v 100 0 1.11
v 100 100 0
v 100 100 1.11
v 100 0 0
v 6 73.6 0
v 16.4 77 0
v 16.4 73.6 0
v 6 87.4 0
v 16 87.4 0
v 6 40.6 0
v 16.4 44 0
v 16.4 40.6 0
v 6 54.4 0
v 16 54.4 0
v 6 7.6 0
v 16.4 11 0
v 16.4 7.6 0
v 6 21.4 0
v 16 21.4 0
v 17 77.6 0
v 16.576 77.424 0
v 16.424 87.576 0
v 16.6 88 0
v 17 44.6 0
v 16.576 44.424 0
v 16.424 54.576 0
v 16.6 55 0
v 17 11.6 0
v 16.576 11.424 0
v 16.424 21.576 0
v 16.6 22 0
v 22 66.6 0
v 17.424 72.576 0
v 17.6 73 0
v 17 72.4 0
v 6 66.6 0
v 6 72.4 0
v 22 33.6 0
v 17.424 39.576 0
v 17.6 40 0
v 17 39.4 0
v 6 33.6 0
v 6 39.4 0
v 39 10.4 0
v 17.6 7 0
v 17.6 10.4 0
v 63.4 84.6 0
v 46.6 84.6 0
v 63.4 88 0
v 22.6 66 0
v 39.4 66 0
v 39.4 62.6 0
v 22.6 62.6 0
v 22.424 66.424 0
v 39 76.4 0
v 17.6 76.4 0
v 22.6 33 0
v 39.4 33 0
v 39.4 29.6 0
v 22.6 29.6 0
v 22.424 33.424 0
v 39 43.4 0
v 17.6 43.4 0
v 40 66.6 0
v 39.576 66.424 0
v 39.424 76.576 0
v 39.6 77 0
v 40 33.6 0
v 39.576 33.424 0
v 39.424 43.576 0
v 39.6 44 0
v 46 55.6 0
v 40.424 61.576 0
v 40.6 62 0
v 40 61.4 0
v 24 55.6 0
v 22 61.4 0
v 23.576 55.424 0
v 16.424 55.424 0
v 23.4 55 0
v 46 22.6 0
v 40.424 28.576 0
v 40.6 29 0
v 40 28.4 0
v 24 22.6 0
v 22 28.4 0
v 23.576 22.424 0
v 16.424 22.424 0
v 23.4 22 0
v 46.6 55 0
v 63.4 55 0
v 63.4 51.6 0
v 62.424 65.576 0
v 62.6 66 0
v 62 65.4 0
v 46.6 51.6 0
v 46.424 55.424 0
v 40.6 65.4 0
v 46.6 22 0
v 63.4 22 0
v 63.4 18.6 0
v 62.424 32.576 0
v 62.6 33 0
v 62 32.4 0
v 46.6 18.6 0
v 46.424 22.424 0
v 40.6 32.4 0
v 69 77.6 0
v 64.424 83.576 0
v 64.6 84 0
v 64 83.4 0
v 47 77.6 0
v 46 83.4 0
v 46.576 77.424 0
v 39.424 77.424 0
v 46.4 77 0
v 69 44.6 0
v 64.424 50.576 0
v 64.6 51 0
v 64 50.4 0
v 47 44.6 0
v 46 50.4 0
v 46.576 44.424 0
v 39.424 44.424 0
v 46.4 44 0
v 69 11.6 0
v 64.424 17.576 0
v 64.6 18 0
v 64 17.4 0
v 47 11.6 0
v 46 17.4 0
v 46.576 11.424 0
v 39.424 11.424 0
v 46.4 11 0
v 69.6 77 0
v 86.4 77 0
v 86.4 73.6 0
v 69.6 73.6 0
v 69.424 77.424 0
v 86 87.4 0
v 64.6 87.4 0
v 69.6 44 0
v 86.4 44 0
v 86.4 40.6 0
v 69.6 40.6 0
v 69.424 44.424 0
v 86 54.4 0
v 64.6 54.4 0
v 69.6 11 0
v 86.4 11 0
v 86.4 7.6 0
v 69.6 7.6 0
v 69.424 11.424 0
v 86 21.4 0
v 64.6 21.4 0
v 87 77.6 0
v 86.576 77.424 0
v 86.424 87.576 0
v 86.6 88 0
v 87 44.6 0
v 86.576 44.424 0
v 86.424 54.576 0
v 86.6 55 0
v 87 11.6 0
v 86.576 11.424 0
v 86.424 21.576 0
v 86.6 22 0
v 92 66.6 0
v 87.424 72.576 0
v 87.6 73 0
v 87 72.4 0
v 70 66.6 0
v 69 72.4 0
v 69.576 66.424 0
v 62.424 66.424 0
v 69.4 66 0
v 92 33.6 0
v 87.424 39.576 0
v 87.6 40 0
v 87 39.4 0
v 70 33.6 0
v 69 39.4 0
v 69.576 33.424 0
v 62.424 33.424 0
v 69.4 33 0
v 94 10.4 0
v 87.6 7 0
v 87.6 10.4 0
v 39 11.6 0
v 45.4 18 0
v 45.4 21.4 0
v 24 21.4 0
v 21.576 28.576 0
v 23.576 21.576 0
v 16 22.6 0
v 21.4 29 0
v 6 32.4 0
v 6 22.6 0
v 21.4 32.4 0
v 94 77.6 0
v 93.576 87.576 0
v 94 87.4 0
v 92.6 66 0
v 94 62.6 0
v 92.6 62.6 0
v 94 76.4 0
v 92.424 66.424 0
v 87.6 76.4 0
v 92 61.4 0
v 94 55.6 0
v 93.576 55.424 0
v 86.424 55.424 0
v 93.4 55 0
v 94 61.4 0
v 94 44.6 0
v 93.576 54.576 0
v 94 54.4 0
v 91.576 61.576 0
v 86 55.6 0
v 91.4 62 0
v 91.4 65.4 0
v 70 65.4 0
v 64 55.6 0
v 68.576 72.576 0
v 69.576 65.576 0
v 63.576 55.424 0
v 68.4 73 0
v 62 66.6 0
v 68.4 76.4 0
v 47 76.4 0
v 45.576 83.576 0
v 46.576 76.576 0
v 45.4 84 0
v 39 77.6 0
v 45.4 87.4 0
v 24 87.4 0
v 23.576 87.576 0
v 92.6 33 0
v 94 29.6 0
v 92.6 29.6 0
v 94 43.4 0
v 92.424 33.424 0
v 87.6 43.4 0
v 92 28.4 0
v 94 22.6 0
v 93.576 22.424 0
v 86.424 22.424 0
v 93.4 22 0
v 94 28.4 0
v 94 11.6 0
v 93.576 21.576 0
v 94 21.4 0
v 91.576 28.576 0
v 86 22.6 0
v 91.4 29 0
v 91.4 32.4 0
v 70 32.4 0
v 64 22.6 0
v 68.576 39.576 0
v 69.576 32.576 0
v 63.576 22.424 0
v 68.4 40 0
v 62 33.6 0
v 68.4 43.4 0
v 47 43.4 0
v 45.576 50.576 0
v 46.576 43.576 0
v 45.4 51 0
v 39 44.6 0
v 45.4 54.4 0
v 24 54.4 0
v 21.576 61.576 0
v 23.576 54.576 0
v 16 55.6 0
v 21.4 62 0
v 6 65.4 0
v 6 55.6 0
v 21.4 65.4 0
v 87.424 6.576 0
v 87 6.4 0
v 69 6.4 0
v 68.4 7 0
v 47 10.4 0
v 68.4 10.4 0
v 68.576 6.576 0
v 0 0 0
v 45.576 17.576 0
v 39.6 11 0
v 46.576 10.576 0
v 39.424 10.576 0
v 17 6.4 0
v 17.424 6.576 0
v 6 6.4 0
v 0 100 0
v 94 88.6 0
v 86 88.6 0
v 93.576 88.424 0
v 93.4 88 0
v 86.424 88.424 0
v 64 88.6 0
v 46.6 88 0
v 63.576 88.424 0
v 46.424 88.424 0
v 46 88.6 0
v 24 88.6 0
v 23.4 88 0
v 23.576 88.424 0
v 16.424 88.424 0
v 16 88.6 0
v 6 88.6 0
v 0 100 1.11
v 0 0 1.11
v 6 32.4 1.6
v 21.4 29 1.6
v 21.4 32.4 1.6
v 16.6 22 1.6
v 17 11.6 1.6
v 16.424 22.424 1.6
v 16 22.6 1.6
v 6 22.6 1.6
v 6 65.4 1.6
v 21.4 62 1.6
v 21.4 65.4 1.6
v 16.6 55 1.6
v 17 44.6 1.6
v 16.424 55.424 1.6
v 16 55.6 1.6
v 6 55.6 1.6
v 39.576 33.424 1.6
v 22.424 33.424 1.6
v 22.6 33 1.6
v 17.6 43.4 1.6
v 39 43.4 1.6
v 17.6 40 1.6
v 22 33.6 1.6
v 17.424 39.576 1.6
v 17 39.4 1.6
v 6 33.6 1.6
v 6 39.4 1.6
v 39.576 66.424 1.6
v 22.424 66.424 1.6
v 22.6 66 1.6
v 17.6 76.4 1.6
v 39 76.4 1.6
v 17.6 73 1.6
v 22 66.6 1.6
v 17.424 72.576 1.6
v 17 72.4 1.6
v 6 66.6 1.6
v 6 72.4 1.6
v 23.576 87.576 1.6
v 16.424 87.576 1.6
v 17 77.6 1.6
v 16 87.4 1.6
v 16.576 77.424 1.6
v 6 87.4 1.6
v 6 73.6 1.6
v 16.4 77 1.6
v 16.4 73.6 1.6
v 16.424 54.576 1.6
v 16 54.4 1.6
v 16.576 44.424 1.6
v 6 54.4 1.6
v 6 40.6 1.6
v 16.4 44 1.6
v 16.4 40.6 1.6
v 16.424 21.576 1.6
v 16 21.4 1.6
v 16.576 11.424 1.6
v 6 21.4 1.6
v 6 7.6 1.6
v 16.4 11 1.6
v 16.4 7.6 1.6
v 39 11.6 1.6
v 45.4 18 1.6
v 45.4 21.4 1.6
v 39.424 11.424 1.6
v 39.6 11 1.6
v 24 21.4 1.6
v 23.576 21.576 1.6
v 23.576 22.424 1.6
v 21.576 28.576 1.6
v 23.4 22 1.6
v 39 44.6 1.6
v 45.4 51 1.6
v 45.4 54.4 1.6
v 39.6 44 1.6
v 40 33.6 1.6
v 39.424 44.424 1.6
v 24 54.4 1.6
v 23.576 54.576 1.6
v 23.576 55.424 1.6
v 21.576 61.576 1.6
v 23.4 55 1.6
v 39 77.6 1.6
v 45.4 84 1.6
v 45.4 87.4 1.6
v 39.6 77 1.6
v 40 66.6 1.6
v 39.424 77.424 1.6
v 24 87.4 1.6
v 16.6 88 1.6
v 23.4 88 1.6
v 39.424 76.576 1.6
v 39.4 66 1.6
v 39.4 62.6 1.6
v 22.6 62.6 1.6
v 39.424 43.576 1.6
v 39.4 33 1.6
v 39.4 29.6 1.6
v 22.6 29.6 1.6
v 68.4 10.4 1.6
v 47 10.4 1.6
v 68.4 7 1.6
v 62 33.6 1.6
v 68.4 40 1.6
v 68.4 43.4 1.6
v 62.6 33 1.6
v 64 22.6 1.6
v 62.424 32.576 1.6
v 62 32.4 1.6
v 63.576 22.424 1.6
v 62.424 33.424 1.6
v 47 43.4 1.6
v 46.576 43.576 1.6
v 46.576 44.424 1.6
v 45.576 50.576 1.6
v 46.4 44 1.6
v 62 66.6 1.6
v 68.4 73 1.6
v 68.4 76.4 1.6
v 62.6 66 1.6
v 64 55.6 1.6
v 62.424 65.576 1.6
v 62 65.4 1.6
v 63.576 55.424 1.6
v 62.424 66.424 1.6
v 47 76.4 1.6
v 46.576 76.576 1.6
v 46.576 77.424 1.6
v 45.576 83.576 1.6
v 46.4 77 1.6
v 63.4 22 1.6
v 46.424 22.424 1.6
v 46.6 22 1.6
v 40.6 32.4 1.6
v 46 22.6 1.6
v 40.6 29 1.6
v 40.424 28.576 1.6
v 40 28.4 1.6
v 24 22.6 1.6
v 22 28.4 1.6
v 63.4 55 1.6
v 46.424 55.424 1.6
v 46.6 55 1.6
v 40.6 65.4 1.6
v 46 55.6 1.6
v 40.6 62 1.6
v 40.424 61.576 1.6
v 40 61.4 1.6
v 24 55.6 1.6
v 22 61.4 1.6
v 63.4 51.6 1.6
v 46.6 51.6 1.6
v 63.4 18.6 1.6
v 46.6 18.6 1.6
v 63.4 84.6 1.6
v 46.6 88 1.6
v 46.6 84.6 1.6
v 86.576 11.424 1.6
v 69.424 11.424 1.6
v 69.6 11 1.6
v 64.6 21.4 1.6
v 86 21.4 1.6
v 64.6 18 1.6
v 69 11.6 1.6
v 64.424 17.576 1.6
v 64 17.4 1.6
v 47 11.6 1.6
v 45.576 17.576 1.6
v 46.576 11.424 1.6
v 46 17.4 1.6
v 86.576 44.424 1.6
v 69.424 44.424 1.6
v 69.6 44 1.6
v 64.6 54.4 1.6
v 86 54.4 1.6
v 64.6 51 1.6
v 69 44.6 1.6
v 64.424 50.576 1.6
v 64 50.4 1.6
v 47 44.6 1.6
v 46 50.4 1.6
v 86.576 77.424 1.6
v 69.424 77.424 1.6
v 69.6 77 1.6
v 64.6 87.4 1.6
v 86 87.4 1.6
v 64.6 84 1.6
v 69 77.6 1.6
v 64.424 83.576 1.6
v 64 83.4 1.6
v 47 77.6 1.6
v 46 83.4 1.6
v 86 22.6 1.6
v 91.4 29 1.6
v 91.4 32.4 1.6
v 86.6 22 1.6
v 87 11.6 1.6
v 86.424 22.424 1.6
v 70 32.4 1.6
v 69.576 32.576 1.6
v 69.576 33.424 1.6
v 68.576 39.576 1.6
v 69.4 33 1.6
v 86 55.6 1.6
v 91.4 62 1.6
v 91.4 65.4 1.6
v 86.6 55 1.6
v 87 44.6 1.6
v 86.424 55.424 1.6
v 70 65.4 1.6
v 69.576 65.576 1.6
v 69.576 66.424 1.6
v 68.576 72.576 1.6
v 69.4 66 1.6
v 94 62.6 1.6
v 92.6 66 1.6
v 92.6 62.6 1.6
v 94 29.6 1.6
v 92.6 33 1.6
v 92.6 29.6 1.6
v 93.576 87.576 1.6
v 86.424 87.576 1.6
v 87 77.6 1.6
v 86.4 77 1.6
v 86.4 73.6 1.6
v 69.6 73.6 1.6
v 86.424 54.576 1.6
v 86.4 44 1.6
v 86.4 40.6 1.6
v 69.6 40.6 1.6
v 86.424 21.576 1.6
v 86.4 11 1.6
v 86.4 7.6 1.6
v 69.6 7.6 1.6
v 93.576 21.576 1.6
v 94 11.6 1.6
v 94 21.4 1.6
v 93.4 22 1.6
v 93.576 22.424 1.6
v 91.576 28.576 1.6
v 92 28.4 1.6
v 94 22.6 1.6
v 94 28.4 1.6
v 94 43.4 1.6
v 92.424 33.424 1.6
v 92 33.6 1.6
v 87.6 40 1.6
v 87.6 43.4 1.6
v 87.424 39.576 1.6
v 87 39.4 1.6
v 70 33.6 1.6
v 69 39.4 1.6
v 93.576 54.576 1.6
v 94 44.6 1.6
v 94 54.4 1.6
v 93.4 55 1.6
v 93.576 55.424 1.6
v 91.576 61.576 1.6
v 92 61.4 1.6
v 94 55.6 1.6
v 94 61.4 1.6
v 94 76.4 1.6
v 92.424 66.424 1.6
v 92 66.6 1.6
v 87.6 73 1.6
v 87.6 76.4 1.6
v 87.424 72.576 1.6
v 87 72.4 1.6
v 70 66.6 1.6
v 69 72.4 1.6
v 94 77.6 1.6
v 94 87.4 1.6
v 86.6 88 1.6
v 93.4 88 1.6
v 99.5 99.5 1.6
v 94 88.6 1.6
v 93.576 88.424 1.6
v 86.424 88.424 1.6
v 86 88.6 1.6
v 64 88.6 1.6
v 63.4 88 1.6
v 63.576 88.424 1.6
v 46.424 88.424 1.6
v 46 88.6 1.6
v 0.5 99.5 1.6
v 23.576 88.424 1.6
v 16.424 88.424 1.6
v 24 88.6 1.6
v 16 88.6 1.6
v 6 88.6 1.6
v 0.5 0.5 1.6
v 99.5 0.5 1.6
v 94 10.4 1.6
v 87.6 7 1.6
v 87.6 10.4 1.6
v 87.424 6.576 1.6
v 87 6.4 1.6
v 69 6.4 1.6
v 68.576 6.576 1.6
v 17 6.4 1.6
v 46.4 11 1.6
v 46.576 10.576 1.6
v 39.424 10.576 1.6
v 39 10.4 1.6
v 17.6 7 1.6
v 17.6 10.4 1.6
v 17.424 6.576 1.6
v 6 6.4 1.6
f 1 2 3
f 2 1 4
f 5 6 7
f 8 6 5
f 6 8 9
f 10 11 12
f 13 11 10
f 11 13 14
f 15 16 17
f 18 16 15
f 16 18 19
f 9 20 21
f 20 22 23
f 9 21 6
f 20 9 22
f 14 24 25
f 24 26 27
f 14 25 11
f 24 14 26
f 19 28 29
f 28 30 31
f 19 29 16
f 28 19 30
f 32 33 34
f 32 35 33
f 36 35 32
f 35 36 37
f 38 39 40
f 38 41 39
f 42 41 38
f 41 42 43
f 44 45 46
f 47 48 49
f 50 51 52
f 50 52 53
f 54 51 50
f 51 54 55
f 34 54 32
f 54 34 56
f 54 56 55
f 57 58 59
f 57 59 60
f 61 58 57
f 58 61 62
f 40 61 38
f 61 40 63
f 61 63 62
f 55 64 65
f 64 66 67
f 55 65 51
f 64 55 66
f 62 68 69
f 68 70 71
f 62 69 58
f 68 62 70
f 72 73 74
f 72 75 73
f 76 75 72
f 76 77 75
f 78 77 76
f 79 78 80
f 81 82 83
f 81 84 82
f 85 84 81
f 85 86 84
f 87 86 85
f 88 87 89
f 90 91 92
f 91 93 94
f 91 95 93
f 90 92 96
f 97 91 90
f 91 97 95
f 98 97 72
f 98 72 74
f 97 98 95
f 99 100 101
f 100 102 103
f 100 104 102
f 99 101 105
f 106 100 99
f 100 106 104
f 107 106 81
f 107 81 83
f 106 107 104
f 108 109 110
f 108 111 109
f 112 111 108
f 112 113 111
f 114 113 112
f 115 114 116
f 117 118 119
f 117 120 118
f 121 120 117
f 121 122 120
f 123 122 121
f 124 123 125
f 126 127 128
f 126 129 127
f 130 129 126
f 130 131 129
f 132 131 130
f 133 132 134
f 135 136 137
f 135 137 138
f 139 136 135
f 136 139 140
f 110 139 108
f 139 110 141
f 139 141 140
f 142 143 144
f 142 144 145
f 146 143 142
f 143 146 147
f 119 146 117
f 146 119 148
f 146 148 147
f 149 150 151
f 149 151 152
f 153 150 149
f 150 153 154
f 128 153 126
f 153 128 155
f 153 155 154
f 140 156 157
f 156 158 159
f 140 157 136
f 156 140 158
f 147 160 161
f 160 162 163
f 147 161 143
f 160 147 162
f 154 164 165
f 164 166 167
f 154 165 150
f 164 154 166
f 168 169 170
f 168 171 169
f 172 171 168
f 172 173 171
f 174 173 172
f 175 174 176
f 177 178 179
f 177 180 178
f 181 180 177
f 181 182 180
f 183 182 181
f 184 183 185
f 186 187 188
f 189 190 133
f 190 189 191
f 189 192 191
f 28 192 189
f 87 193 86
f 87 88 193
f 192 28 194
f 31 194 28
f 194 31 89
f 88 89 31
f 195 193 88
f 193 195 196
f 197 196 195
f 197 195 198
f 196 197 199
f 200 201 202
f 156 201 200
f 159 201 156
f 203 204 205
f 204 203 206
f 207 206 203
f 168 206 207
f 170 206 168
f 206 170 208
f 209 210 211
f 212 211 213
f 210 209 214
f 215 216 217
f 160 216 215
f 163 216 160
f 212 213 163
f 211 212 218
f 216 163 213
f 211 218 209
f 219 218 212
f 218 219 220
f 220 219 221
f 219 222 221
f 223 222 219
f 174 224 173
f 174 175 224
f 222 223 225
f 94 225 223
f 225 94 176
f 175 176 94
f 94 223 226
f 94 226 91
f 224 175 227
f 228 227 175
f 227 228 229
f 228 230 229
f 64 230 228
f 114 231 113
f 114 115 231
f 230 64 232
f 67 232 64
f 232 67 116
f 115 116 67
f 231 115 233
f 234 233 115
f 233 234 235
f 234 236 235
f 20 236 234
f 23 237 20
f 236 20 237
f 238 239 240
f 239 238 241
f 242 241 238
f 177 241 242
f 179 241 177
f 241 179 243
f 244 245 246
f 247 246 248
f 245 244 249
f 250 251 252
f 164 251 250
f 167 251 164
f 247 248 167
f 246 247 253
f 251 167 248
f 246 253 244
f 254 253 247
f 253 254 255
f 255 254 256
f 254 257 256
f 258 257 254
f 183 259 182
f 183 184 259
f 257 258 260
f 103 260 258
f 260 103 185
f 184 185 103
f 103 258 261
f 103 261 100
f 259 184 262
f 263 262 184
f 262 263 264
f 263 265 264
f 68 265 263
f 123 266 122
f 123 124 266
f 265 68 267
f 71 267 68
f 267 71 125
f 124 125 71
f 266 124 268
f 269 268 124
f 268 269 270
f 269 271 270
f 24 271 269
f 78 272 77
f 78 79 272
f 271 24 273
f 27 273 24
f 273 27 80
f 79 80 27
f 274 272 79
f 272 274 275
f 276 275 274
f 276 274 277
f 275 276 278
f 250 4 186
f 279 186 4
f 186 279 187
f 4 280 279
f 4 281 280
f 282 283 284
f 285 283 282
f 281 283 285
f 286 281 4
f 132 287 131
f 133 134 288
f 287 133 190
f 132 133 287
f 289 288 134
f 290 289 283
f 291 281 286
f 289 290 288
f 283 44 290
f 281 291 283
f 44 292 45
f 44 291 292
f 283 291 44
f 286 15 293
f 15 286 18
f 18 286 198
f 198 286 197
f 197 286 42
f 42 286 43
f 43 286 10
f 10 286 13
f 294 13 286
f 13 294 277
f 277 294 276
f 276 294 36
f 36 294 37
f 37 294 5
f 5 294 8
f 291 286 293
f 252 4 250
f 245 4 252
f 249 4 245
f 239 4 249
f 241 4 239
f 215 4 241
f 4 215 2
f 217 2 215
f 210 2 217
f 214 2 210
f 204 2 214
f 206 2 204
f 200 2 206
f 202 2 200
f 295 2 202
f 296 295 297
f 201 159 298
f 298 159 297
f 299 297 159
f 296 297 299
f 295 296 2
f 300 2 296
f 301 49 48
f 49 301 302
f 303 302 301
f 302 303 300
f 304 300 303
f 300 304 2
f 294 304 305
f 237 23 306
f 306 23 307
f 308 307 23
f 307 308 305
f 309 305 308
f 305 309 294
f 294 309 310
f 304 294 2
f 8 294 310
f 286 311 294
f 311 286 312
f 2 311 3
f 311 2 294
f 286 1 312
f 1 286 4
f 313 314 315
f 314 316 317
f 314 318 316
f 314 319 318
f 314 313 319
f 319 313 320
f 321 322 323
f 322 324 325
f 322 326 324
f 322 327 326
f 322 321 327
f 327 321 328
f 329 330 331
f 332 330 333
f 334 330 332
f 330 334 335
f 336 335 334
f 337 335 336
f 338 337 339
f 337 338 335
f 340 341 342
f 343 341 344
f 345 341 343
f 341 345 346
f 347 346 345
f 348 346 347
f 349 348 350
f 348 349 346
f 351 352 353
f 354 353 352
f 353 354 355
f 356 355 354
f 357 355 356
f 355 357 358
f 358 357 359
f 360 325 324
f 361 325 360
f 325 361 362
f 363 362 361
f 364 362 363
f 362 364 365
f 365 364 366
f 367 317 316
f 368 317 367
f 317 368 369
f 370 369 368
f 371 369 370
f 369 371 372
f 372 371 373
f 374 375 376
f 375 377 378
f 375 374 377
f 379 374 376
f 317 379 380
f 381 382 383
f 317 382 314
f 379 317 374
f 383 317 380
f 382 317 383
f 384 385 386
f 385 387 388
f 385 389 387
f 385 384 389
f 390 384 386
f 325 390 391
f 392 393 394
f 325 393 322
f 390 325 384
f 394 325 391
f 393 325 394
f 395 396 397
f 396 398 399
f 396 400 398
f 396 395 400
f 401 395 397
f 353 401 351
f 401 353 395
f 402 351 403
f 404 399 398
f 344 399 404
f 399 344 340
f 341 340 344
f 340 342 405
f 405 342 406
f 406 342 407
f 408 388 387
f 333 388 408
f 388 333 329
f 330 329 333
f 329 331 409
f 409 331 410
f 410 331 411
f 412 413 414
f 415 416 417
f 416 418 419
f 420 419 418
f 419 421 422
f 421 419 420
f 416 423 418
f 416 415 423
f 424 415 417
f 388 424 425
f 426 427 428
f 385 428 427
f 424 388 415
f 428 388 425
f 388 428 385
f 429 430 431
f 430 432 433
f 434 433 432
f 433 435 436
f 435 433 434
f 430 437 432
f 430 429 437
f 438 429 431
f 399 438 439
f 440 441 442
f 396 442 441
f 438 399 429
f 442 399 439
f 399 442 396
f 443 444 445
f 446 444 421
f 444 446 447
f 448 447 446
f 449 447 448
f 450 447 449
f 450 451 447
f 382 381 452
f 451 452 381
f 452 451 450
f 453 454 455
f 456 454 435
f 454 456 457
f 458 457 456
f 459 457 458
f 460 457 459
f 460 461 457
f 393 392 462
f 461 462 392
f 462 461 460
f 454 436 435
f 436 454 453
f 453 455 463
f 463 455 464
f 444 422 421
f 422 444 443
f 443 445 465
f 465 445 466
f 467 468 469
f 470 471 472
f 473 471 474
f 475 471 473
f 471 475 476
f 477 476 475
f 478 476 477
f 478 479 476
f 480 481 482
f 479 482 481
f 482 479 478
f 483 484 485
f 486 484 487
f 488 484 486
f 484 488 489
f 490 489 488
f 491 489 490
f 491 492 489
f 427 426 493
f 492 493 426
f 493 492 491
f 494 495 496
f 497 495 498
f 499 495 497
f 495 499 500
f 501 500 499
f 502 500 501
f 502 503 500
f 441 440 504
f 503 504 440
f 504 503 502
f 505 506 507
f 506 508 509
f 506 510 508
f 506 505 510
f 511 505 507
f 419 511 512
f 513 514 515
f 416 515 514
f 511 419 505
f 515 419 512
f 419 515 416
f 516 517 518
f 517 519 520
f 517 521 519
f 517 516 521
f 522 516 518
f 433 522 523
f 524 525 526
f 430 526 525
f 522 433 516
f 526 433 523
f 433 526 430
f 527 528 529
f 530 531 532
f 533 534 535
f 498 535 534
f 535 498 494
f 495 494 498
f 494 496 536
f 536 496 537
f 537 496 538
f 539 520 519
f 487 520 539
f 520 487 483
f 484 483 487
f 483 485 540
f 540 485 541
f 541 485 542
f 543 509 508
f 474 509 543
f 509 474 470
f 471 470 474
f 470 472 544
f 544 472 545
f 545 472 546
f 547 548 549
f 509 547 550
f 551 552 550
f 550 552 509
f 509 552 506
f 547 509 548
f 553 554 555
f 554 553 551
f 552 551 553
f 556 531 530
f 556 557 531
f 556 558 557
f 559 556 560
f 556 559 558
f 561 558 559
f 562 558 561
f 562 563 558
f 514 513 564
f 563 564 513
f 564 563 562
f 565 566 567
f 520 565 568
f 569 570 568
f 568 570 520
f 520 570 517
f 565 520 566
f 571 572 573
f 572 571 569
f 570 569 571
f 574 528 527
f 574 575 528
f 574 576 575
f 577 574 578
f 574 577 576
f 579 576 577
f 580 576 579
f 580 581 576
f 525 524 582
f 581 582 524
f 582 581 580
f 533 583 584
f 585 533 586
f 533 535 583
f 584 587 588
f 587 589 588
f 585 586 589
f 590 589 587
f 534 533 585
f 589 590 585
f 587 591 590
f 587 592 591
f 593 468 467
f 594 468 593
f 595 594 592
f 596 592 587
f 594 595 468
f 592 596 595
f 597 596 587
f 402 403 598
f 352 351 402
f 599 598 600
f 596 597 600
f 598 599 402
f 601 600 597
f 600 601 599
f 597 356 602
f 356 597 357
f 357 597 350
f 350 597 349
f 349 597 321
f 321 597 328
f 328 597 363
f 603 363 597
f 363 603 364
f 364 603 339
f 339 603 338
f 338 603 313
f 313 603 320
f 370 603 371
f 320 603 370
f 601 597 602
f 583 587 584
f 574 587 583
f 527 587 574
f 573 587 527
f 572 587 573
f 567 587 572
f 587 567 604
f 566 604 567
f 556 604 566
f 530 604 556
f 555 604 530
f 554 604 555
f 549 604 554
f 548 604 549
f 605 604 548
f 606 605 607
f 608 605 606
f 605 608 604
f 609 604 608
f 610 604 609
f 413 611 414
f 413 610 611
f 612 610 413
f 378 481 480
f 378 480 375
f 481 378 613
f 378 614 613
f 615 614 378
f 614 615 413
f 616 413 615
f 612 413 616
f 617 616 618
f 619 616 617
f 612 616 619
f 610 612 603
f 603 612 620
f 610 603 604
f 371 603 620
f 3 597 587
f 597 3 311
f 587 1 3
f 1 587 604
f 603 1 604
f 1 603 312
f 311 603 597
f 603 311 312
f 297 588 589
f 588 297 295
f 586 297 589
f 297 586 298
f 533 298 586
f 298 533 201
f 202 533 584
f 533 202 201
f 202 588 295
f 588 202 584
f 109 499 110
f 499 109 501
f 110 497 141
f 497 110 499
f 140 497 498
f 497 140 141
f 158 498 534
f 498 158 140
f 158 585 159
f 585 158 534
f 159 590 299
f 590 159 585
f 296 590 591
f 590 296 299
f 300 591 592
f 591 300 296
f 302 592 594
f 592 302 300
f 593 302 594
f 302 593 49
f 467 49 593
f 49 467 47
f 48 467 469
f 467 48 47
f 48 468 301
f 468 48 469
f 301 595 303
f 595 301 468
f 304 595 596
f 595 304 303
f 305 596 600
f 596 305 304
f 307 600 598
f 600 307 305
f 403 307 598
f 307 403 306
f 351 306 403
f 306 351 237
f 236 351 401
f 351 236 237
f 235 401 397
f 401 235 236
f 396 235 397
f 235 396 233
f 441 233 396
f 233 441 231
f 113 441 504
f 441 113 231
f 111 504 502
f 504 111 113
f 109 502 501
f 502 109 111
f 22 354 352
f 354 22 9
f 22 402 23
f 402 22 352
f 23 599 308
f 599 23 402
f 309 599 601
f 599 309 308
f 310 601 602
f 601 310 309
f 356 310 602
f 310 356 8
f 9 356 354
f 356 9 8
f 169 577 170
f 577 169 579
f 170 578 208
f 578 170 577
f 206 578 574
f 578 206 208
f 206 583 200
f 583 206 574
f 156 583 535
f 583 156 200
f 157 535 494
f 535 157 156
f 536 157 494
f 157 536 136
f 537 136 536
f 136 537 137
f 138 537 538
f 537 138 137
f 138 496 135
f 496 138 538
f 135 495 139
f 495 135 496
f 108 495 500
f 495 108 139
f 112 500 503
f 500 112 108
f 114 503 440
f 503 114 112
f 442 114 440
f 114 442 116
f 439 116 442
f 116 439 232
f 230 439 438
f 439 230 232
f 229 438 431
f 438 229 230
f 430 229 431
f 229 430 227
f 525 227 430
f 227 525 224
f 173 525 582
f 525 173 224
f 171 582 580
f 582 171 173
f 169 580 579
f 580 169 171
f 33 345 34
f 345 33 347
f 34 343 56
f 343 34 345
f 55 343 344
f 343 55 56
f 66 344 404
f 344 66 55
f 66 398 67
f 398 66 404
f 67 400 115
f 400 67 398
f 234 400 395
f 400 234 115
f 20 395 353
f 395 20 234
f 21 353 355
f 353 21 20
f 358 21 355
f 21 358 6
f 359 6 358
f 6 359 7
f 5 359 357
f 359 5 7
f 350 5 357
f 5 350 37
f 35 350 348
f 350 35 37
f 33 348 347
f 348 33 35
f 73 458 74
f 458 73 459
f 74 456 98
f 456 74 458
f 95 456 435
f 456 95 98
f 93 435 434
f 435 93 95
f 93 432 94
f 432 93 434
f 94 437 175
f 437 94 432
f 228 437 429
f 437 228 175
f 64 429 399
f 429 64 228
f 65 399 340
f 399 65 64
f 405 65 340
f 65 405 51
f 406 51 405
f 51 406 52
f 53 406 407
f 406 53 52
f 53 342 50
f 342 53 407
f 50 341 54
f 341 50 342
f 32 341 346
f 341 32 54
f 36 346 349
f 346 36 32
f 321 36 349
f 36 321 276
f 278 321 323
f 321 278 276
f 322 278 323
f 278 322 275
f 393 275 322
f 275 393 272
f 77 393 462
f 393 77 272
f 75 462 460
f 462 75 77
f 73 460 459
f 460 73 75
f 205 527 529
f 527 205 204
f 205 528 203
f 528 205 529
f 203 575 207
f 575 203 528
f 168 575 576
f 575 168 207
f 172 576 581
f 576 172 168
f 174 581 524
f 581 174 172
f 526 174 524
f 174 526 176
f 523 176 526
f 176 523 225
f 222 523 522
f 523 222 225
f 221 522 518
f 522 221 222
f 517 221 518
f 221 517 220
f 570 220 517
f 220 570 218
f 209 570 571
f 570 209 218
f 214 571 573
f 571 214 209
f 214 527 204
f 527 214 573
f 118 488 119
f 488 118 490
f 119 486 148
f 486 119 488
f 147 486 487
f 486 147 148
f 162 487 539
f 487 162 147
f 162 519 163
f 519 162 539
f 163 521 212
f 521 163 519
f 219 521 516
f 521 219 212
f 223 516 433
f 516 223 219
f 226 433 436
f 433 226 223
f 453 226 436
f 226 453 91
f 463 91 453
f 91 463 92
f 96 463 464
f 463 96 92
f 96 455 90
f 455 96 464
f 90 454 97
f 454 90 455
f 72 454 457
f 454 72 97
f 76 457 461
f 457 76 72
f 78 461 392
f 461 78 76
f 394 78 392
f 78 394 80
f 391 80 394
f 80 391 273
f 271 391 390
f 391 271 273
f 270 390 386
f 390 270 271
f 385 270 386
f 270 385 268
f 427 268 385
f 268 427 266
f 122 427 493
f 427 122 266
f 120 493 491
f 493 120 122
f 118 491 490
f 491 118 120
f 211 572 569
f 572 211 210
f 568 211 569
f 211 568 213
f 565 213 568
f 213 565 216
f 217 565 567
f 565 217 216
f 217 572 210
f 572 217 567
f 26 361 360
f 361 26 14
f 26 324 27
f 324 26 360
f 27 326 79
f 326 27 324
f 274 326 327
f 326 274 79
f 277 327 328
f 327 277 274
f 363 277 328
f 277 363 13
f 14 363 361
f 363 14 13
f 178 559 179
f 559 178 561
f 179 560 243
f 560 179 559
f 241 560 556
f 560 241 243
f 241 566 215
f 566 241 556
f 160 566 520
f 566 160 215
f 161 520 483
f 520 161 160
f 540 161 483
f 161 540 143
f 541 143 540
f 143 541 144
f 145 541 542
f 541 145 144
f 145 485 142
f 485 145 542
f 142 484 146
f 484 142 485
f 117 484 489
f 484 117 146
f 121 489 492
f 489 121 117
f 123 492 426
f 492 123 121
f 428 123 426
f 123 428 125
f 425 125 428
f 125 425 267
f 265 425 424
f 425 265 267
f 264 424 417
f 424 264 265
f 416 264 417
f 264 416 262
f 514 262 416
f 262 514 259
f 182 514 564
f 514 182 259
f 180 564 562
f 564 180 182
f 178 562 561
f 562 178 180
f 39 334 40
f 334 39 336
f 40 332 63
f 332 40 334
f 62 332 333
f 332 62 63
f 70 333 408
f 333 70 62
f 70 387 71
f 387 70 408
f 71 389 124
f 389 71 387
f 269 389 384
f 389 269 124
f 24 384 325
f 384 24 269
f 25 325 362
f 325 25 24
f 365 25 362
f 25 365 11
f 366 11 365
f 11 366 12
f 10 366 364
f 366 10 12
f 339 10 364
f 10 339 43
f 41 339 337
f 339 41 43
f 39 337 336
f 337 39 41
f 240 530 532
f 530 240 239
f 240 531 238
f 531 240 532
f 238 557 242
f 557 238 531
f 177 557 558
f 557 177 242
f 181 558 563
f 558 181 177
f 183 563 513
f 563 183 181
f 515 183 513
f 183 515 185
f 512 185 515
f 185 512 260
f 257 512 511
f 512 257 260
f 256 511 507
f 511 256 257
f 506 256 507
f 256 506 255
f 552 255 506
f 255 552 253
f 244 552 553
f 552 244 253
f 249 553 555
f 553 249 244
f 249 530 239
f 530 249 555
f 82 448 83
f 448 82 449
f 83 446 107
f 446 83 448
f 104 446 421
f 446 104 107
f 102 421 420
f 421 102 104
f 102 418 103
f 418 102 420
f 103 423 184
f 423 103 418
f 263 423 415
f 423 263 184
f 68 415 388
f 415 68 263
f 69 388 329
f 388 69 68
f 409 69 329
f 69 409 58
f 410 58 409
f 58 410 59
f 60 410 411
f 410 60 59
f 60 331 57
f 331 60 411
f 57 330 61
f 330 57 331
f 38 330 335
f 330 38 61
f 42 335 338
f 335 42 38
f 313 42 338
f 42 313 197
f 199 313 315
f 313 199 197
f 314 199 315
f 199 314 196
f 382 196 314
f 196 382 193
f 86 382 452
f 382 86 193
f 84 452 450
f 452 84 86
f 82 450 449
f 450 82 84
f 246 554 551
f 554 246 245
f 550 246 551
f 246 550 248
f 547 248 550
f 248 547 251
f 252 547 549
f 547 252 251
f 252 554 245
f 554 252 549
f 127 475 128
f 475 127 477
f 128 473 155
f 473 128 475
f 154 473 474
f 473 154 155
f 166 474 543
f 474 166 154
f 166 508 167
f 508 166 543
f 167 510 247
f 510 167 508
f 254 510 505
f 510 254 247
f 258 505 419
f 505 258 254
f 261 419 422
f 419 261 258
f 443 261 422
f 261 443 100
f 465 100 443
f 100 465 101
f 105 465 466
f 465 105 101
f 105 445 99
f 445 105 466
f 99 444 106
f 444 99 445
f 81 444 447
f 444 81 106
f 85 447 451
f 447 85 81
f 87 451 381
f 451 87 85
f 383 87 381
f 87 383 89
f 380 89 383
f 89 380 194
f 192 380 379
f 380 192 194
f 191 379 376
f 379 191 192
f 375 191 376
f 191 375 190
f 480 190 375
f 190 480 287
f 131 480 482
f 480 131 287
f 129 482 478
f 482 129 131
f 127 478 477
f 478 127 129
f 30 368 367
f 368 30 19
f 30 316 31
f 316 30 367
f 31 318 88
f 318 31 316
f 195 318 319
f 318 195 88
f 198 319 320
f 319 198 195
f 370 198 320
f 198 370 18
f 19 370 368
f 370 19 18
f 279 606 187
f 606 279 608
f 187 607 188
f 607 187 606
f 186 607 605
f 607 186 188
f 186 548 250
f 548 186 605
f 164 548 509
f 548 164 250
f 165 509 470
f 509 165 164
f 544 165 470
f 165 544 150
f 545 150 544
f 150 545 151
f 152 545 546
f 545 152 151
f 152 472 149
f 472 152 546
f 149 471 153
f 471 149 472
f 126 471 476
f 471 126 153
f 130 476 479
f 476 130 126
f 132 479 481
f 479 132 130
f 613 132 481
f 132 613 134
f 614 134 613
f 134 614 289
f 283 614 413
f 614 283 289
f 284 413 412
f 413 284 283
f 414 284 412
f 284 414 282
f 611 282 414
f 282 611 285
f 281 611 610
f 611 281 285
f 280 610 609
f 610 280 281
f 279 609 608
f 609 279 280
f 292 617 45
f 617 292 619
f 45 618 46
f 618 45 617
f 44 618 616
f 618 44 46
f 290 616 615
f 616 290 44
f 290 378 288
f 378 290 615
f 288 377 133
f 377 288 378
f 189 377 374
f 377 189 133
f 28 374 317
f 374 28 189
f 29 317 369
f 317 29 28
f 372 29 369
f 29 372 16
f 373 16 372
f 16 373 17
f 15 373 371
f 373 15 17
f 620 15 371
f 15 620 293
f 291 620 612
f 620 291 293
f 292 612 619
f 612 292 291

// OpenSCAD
// file: sashiko_config.scad
// sashiko_config.scad
// Shared plate configuration for every sashiko template. Change a value here and
// it applies to all templates at once. Each template `include`s this file — use
// `include`, NOT `use`, because `use` does not import top-level variables — and
// keeps only its own pattern-specific parameters (scale, corner_gap, bridge_sp …).

plate_w  = 100;   // plate width (mm)
plate_h  = 100;   // plate height (mm)
plate_t  = 1.6;   // plate thickness (mm) — slots are cut through all of it
groove_w = 1.2;   // slot width (mm)
border   = 6;     // solid border around plate edge (mm)
chamfer  = 0.5;   // 45° bevel on the four outer top edges (mm; 0 = off, keep <= t/2)
bridge_w = 1.4;   // solid tab left in each bridged slot (mm; ~1.2 min for strength)
reg      = false; // cut datum holes at the pattern-window corners for tiling (see README)
// file: sashiko_lib.scad
// sashiko_lib.scad
// Shared geometry helpers for sashiko stitch-guide templates.
//
// The slot pattern is built entirely in 2D and extruded ONCE at the end (see
// sashiko_plate). This is far faster than unioning thousands of 3D solids.
//
// Slots are cut FULL-THICKNESS so a marking pen/chalk reaches the fabric, and
// are interrupted by small solid "bridges" so the enclosed regions of a
// continuous-line pattern stay attached to the plate instead of dropping out.

// --- low level (2D) -------------------------------------------------------

// 2D rounded slot dash (a "stadium") between two points.
module slot_dash(p1, p2, r) {
    hull() {
        translate(p1) circle(r = r, $fn = 8);
        translate(p2) circle(r = r, $fn = 8);
    }
}

// Straight slot p1->p2 pulled in by `gap` at each end, leaving a solid corner
// where several meet (the corner-gap trick used by the polygon tilings — hishi,
// kikko, masu, …). Size gap to the SHARPEST angle θ between slots at the vertex:
// the solid neck between two caps is 2·gap·sin(θ/2) − 2r, so for a ~0.6 mm neck
// gap = 1.4 suits 90° corners and gap = 1.8 suits 60° corners.
module corner_seg(p1, p2, r, gap) {
    corner_seg2(p1, p2, r, gap, gap);
}

// corner_seg with a different gap at each end — for edges whose two vertices
// have different angles (size each gap to its own vertex; see itomaki,
// sorobandama).
module corner_seg2(p1, p2, r, g1, g2) {
    L = norm([p2[0]-p1[0], p2[1]-p1[1]]);
    d = [(p2[0]-p1[0])/L, (p2[1]-p1[1])/L];
    if (L > g1 + g2 + 0.1)
        slot_dash([p1[0]+d[0]*g1, p1[1]+d[1]*g1],
                  [p2[0]-d[0]*g2, p2[1]-d[1]*g2], r);
}

// Regular hexagon outline of corner-gapped edges. a0 = first-vertex angle:
// 90 = pointy-top (default), 0 = flat-top.
module hex_outline(c, R, r, gap, a0 = 90) {
    V = [for (i = [0:5]) [c[0] + R*cos(a0 + 60*i), c[1] + R*sin(a0 + 60*i)]];
    for (i = [0:5]) corner_seg(V[i], V[(i+1) % 6], r, gap);
}

// --- straight slot with periodic bridges ---------------------------------

// Straight slot p1->p2. Always leaves >=1 bridge (so the faces on either side
// stay connected); long runs get extra bridges at ~bridge_sp spacing.
// Dash ends are pulled in by the cap radius r so the *solid* tab left behind
// is bridge_w wide (not bridge_w - 2r).
module bridged_line(p1, p2, r, bridge_w, bridge_sp) {
    L = norm([p2[0] - p1[0], p2[1] - p1[1]]);
    if (L > 0.001) {
        dir = [(p2[0] - p1[0]) / L, (p2[1] - p1[1]) / L];
        hw  = bridge_w / 2 + r;                  // half-gap incl. cap radius
        nb  = max(1, floor(L / bridge_sp));      // bridge count
        cuts   = [for (k = [1 : nb]) k * L / (nb + 1)];
        bounds = concat([0],
                        [for (c = cuts) each [c - hw, c + hw]],
                        [L]);
        for (i = [0 : len(bounds)/2 - 1]) {
            a = bounds[2*i];
            b = bounds[2*i + 1];
            if (b - a > 0.05)
                slot_dash([p1[0] + dir[0]*a, p1[1] + dir[1]*a],
                          [p1[0] + dir[0]*b, p1[1] + dir[1]*b], r);
        }
    }
}

// --- circular slot with bridges at given angles --------------------------

// Smooth thick arc from angle a1 to a2 (degrees) on circle (centre c, radius R).
module arc_run(c, R, r, a1, a2) {
    span  = a2 - a1;
    steps = max(1, ceil(abs(span) / 6));
    for (i = [0 : steps - 1]) {
        t1 = a1 + span * i       / steps;
        t2 = a1 + span * (i + 1) / steps;
        slot_dash([c[0] + R*cos(t1), c[1] + R*sin(t1)],
                  [c[0] + R*cos(t2), c[1] + R*sin(t2)], r);
    }
}

// Open arc slot (a1->a2 degrees) with periodic bridges along its length.
// Unlike bridged_line it allows zero bridges on short arcs (an open arc does
// not enclose a region on its own).
module bridged_arc(c, R, r, a1, a2, bridge_w, bridge_sp) {
    L  = R * abs(a2 - a1) * PI / 180;
    nb = floor(L / bridge_sp);
    ha = (bridge_w / 2 + r) / R * 180 / PI;      // half gap in degrees
    cuts   = nb < 1 ? [] : [for (k = [1 : nb]) a1 + (a2 - a1) * k / (nb + 1)];
    bounds = concat([a1], [for (cg = cuts) each [cg - ha, cg + ha]], [a2]);
    for (i = [0 : len(bounds)/2 - 1]) {
        b1 = bounds[2*i];
        b2 = bounds[2*i + 1];
        if (b2 - b1 > 0.1) arc_run(c, R, r, b1, b2);
    }
}

// Full circle slot, broken by a bridge centred on each angle in bridge_angles.
module bridged_circle(c, R, r, bridge_w, bridge_angles) {
    half = (bridge_w / 2 + r) / R * 180 / PI;   // half gap (deg), incl. caps
    n = len(bridge_angles);
    for (k = [0 : n - 1]) {
        a1 = bridge_angles[k];
        a2 = bridge_angles[(k + 1) % n] + (k == n - 1 ? 360 : 0);
        arc_run(c, R, r, a1 + half, a2 - half);
    }
}

// --- plate assembly -------------------------------------------------------

// Solid plate with the 2D pattern (children) cut through it, clipped to an
// inner border. The pattern is intersected with the inner rectangle and
// extruded a single time for speed.
//
// chamfer (mm, 0 = off) bevels the four OUTER top edges at 45°. It only touches
// the solid border (border > chamfer), never the slots, which are still cut
// full-thickness afterwards. Keep chamfer < t (ideally <= t/2).
//
// reg (off by default) cuts a datum hole at each corner of the pattern window.
// Mark those four dots, then reposition the plate so its leading holes sit on the
// previous placement's dots: that steps the plate by exactly the window size
// (w-2*border, h-2*border) and butts the patterns at the boundary — seamless when
// the pattern's repeat divides that pitch.
module sashiko_plate(w, h, t, border, chamfer = 0, reg = false, reg_d = 1.5, eps = 0.1) {
    difference() {
        if (chamfer > 0) chamfered_box(w, h, t, chamfer);
        else             cube([w, h, t]);
        translate([0, 0, -eps])
        linear_extrude(t + 2*eps)
        intersection() {
            translate([border, border])
                square([w - 2*border, h - 2*border]);
            children();
        }
        if (reg)
            translate([0, 0, -eps])
            linear_extrude(t + 2*eps)
            for (x = [border, w - border], y = [border, h - border])
                translate([x, y]) circle(r = reg_d/2, $fn = 24);
    }
}

// A box whose four top outer edges are chamfered at 45° (c tall, c wide): full
// box up to t-c, then a frustum that insets by c over the last c of height.
module chamfered_box(w, h, t, c) {
    union() {
        cube([w, h, t - c]);
        hull() {
            translate([0, 0, t - c]) linear_extrude(0.01) square([w, h]);
            translate([c, c, t - 0.01]) linear_extrude(0.01) square([w - 2*c, h - 2*c]);
        }
    }
}
// main file
// Description: **Egasumi** — Mist Bands (絵霞)
// Egasumi (Mist Bands / 絵霞) Sashiko Template
// The classical mist symbol: long horizontal bars whose middles step down and
// back up, drifting at staggered offsets row to row. Each band is one open
// polyline, so no bridges are needed — an airy ground between denser motifs.

use <sashiko_lib.scad>
include <sashiko_config.scad>

L1   = 22;   // outer bar length (mm)
L2   = 18;   // dipped middle bar length (mm)
v    = 4;    // step depth (mm)
gx   = 8;    // gap between bands along a row (mm)
py   = 11;   // row spacing (mm)

p = 2*L1 + L2 + gx;   // band period along a row
r = groove_w / 2;

module kasumi(x0, y0) {
    slot_dash([x0,           y0],     [x0 + L1,          y0],     r);
    slot_dash([x0 + L1,      y0],     [x0 + L1,          y0 - v], r);
    slot_dash([x0 + L1,      y0 - v], [x0 + L1 + L2,     y0 - v], r);
    slot_dash([x0 + L1 + L2, y0 - v], [x0 + L1 + L2,     y0],     r);
    slot_dash([x0 + L1 + L2, y0],     [x0 + 2*L1 + L2,   y0],     r);
}

sashiko_plate(plate_w, plate_h, plate_t, border, chamfer, reg)
union()
    for (j = [0 : ceil(plate_h / py) + 1])
        for (m = [-1 : ceil(plate_w / p) + 1])
            kasumi(m*p - (j % 3)*23, j*py);
